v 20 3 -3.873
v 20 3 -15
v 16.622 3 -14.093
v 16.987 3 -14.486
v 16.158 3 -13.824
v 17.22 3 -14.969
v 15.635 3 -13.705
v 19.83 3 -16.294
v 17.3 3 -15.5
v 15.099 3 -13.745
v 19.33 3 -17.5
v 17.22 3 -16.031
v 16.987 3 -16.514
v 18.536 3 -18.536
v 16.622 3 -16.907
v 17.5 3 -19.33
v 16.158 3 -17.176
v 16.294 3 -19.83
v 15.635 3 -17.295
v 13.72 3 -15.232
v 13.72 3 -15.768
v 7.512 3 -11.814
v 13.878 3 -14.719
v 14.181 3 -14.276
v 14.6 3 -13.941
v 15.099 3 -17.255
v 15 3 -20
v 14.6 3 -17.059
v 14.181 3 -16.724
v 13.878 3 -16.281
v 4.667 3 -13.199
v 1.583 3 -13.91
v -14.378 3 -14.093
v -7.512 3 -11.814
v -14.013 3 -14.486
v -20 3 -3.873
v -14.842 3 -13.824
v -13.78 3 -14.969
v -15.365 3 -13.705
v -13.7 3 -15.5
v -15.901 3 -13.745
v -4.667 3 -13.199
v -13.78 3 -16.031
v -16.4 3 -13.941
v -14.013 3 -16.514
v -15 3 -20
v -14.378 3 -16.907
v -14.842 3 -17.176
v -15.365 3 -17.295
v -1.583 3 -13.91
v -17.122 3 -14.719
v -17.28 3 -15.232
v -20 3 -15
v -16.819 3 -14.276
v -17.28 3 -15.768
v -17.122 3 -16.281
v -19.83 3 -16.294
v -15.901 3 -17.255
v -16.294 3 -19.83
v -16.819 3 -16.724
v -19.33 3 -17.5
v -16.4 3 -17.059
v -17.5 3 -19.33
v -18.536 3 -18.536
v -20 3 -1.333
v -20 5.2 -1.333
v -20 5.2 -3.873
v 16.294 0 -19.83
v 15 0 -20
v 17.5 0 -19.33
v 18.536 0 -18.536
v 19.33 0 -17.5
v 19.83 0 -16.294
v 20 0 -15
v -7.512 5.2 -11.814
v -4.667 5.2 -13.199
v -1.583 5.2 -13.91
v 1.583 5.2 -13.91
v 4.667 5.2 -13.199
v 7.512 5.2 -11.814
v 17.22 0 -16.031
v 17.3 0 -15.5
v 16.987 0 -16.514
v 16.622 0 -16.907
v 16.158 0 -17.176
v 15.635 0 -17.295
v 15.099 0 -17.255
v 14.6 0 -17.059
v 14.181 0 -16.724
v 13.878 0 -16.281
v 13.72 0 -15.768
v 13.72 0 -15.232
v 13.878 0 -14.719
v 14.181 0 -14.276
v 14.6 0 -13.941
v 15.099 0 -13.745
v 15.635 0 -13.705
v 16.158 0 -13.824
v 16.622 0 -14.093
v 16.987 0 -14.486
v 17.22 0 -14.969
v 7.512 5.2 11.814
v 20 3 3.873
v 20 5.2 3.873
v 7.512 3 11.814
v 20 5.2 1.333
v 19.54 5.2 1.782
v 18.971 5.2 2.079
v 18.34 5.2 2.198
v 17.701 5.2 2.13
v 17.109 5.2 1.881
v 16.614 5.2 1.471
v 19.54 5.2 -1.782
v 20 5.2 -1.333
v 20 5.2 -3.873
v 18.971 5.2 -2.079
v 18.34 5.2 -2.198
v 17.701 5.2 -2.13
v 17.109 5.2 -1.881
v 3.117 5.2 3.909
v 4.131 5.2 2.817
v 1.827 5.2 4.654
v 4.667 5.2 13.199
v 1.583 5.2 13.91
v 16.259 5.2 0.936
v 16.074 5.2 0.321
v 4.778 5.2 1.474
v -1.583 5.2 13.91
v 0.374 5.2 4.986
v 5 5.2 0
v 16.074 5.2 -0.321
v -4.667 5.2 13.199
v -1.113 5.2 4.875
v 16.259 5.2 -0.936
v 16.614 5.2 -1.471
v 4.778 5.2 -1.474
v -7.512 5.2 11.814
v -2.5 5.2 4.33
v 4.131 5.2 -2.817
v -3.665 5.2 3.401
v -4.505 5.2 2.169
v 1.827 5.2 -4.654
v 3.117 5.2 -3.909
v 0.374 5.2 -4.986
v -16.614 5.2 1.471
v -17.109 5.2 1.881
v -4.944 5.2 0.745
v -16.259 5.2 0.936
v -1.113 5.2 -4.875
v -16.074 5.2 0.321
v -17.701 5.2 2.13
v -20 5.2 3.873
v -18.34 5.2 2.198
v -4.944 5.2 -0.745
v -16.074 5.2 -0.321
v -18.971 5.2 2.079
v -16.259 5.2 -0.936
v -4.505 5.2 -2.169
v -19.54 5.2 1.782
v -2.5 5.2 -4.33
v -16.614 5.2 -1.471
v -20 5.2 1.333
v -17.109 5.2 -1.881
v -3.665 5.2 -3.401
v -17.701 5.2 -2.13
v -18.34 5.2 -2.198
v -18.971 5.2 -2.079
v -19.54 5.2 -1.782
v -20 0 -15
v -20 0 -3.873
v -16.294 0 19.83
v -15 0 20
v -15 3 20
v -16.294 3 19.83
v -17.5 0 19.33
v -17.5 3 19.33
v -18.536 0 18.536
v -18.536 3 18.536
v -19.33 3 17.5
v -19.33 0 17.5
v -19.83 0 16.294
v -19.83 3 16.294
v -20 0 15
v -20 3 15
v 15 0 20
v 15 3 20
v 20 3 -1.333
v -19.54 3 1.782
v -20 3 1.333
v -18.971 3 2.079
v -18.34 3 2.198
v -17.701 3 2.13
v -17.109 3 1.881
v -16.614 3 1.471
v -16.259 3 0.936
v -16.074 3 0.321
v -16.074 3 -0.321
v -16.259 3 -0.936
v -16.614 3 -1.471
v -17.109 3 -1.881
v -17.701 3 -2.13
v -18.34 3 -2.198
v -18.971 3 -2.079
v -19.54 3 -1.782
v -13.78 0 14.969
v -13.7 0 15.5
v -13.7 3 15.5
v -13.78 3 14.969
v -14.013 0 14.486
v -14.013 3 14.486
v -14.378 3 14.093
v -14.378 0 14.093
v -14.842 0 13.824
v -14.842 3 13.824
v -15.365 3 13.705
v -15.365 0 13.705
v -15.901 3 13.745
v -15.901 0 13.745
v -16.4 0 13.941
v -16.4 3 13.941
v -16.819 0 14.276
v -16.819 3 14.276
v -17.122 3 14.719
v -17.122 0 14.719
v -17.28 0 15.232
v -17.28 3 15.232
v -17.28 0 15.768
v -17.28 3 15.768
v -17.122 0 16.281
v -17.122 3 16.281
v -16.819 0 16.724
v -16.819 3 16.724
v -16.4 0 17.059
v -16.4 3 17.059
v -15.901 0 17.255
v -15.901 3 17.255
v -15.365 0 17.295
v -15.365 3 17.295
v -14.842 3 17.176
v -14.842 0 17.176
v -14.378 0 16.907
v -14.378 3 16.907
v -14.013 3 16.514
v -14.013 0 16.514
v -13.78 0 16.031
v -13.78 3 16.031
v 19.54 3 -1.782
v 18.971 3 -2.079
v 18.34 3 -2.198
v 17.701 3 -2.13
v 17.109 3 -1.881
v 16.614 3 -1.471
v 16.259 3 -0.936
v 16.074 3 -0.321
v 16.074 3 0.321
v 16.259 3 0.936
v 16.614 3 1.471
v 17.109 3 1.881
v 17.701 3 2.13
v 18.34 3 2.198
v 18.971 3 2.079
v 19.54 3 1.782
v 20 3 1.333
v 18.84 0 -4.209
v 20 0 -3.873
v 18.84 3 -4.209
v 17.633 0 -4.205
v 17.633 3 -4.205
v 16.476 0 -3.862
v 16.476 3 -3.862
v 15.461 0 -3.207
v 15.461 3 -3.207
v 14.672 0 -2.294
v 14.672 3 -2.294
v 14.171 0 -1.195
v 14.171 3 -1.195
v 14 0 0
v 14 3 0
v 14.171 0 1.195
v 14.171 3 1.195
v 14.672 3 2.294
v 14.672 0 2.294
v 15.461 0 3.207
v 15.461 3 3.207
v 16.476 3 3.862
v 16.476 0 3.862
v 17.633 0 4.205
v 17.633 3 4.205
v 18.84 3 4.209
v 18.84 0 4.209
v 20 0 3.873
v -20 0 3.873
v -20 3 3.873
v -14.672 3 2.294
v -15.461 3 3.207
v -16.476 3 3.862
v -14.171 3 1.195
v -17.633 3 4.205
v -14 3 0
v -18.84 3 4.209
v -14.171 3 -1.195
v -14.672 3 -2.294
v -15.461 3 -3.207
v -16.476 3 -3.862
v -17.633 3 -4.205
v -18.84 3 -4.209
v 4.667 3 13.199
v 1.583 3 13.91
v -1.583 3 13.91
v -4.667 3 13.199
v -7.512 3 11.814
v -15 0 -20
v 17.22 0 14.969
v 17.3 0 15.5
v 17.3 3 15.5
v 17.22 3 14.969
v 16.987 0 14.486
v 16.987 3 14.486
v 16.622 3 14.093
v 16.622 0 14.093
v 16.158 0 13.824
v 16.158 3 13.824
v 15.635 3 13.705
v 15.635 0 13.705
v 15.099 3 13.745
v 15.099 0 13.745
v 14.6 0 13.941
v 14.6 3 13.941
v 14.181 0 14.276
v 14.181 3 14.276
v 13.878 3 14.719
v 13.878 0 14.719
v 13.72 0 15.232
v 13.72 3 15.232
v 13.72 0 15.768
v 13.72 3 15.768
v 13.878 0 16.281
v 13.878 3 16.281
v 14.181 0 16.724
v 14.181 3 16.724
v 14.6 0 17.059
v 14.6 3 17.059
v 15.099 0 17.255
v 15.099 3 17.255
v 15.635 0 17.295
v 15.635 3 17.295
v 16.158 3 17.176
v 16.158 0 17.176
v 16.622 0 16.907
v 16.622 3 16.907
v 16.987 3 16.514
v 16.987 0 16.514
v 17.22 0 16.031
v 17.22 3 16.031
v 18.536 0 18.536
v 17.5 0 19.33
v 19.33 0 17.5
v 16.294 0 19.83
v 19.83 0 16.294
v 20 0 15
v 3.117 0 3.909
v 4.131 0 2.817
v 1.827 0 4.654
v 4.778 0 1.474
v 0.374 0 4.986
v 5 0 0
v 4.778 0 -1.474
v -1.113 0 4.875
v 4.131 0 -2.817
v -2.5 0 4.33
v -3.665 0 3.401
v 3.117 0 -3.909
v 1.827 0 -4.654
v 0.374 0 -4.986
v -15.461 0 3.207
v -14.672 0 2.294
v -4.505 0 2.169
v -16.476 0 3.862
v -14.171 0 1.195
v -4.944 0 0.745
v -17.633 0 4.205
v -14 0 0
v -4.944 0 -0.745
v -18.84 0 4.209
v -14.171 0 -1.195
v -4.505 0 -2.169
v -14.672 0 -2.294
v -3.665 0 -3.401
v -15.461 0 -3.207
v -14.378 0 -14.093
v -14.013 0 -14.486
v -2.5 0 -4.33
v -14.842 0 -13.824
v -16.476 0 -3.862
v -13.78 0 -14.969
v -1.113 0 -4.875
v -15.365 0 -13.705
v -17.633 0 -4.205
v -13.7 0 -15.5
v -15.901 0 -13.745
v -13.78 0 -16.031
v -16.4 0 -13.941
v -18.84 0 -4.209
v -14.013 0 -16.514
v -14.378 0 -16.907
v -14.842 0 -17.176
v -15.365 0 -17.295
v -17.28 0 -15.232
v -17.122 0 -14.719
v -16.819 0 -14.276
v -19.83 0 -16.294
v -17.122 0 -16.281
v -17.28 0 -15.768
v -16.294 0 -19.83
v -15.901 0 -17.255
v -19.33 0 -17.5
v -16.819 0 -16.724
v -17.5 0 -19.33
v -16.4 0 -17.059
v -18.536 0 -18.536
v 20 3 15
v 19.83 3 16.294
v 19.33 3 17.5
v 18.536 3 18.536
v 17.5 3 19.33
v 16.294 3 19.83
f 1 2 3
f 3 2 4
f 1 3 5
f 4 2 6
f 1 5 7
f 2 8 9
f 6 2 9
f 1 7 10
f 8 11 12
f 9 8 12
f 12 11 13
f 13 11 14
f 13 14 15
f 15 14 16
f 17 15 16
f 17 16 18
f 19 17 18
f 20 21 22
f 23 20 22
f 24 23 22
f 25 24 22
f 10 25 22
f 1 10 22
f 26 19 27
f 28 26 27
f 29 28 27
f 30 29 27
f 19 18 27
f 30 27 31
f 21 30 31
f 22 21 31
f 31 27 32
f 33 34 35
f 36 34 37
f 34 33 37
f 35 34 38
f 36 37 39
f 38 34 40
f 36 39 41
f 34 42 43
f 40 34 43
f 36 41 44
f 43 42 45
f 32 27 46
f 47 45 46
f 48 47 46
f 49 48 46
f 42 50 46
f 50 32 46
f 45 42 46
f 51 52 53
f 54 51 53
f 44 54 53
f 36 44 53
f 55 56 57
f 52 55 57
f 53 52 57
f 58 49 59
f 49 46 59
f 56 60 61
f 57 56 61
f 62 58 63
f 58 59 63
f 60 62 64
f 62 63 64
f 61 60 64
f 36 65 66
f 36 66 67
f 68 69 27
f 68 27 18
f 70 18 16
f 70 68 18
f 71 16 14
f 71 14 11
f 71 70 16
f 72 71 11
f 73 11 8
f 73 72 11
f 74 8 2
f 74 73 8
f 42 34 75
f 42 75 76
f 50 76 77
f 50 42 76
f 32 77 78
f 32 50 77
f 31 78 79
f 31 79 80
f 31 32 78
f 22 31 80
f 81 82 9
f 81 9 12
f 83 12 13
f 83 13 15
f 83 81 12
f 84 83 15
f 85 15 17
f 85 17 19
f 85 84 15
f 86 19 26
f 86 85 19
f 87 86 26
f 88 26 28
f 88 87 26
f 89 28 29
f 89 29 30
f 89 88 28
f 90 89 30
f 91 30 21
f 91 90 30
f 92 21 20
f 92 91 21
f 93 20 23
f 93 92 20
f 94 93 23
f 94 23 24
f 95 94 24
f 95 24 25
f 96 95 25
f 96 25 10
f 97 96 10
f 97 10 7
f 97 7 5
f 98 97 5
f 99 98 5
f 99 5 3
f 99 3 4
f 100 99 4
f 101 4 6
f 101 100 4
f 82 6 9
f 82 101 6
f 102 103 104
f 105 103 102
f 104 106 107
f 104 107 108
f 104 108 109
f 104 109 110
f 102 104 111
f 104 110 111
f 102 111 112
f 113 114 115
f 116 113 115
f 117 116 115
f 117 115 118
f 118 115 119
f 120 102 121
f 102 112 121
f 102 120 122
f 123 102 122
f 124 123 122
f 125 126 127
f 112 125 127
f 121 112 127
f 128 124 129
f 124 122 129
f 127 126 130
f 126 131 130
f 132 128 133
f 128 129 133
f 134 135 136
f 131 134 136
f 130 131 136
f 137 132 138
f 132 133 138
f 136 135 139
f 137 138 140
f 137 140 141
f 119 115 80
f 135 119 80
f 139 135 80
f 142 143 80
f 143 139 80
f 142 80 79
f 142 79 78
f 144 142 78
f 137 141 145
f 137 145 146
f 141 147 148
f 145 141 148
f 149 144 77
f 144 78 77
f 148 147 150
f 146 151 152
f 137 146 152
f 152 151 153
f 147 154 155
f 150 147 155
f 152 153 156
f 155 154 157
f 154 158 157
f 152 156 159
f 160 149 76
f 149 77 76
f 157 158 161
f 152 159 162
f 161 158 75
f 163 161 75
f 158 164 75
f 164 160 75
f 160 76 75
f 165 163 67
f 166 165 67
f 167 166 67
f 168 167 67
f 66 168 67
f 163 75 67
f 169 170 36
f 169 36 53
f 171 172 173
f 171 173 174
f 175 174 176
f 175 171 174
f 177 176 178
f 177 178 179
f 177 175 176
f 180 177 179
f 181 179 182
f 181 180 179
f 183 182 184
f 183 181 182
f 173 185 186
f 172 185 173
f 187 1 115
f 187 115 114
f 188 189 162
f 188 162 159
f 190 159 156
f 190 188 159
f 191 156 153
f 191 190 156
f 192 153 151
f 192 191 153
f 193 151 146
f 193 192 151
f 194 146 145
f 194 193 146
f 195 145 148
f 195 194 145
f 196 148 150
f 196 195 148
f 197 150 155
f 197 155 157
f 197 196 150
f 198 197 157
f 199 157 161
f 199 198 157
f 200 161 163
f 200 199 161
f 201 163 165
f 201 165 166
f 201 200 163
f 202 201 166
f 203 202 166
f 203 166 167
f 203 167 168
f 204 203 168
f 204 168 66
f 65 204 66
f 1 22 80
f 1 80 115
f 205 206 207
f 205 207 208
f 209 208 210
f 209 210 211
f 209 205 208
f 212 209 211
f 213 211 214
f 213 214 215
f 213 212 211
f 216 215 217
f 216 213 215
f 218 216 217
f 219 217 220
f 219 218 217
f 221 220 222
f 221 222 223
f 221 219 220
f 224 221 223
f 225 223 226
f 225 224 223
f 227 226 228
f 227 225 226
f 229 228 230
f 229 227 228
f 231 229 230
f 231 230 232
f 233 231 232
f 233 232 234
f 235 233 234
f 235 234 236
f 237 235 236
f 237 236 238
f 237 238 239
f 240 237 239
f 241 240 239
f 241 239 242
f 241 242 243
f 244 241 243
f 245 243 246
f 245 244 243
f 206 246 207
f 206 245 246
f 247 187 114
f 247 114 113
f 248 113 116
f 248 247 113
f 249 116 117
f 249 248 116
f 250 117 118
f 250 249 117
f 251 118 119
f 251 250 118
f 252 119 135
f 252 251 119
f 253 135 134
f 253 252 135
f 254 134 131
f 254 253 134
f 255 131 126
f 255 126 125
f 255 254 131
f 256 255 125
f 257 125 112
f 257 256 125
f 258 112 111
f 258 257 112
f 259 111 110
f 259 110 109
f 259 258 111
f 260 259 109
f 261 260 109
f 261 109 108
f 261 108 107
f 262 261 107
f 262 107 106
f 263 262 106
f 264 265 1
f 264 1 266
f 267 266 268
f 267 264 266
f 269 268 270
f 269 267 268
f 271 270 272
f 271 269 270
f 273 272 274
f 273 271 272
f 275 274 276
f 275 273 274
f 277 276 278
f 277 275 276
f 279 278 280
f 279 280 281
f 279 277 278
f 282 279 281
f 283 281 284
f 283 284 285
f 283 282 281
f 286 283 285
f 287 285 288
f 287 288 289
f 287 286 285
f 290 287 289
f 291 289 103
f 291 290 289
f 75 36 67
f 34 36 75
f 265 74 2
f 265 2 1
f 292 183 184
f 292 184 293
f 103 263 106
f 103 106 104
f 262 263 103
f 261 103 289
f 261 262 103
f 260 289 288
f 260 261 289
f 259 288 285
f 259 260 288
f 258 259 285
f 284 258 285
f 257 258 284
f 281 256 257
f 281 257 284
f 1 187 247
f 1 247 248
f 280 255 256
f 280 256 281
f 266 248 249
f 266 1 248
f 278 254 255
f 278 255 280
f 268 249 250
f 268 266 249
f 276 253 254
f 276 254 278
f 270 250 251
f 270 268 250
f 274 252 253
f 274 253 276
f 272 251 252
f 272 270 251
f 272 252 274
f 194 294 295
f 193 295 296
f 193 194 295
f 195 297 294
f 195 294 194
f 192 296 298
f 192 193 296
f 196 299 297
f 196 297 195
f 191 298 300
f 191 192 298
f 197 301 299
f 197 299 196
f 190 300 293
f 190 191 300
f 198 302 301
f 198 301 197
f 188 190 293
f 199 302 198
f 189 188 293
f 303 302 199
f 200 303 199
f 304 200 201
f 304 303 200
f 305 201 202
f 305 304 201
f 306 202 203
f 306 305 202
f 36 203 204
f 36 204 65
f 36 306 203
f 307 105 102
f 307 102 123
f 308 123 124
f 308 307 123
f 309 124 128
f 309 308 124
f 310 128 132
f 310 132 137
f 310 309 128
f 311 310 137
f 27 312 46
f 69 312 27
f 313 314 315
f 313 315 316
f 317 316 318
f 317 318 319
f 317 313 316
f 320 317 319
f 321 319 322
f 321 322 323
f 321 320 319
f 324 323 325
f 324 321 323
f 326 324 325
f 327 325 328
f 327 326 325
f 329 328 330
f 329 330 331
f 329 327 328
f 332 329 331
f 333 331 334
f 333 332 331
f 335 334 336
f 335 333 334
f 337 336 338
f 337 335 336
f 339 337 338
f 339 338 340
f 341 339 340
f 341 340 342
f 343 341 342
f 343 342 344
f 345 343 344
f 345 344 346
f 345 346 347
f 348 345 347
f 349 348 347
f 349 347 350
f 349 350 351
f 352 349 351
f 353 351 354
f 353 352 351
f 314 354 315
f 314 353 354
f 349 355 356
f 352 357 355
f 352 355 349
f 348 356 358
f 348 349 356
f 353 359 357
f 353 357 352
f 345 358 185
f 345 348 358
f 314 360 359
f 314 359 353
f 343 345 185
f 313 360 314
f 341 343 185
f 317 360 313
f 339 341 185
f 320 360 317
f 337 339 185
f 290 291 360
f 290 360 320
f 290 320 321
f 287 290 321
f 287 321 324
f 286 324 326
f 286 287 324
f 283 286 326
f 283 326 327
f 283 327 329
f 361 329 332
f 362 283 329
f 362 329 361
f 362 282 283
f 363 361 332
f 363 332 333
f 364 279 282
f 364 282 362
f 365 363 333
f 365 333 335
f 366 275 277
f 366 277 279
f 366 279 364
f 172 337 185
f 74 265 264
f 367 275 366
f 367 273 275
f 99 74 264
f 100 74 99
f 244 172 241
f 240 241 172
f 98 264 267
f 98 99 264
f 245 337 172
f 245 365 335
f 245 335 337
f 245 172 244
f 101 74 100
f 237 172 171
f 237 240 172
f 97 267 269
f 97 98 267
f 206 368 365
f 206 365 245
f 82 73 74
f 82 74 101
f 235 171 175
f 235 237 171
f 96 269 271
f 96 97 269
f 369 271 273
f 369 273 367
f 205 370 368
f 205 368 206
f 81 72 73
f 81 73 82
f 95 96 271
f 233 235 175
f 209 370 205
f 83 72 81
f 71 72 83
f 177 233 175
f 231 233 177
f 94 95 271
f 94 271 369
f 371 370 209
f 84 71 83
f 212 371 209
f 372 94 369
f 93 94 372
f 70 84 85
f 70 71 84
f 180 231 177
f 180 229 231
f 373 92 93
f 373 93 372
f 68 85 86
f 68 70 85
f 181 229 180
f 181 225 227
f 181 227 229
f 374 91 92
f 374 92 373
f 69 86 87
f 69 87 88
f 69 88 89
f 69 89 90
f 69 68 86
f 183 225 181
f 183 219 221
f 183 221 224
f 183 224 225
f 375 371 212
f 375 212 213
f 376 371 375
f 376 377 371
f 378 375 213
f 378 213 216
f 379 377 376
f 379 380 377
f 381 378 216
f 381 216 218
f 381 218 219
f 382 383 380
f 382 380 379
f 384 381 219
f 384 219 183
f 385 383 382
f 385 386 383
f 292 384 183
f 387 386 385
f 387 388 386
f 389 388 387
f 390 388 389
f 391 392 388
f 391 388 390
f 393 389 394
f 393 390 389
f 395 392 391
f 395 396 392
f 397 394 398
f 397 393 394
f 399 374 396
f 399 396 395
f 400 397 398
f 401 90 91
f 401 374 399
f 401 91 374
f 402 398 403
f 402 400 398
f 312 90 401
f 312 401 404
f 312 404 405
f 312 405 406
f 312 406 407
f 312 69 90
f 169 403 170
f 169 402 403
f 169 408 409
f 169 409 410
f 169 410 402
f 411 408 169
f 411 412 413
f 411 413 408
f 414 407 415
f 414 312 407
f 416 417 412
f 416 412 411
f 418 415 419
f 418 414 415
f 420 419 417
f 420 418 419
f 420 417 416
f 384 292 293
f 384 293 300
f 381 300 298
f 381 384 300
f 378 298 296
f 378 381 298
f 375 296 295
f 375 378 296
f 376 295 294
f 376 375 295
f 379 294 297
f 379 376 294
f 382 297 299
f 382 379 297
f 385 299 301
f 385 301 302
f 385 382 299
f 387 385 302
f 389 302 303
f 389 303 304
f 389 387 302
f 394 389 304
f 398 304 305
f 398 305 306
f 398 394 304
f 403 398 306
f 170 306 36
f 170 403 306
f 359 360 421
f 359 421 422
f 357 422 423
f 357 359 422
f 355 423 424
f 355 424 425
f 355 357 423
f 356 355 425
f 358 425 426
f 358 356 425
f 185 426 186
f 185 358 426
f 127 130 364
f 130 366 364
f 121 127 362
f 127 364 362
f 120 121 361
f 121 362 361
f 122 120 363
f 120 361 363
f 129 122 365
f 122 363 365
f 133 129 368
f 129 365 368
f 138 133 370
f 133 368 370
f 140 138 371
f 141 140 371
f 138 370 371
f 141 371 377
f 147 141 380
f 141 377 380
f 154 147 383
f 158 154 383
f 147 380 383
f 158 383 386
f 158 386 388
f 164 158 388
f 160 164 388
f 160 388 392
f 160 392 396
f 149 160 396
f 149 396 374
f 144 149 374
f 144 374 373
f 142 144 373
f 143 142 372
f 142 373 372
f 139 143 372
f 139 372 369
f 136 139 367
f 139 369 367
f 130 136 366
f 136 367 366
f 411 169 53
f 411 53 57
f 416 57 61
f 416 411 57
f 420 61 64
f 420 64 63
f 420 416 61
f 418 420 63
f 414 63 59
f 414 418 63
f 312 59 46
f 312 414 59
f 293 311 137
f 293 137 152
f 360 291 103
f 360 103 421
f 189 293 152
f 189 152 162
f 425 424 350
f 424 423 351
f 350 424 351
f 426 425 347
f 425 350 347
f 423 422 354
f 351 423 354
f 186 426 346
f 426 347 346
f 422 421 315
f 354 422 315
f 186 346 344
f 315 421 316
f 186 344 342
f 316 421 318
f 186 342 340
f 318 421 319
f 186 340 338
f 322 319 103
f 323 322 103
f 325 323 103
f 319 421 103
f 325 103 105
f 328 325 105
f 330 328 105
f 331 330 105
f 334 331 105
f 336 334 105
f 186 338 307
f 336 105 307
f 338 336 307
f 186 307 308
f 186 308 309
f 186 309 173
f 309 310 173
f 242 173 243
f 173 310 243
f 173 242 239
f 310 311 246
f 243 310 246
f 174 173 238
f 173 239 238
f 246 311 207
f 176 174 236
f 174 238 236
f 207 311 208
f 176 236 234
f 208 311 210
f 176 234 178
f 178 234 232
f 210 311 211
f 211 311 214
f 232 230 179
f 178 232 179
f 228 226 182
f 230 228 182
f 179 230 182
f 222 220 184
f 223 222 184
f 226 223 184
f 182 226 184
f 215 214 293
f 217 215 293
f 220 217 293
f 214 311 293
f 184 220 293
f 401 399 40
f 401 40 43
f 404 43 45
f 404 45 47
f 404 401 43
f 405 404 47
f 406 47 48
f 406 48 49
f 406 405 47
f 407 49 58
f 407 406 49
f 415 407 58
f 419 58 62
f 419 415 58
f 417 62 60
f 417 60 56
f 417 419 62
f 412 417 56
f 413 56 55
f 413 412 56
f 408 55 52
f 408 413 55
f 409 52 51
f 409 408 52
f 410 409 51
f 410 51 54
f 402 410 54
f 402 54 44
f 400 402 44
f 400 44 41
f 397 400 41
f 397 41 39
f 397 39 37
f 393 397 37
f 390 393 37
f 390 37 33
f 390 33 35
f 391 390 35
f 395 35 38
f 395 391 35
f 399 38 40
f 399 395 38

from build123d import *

# Parameters (mm, degrees)
SKETCH_1_R          = 1.8
SKETCH_1_R_2        = 5
EXTRUDE_1_DEPTH     = 3
EXTRUDE_2_DEPTH     = 2.2
SKETCH_3_R          = 5
CUT_EXTRUDE_1_DEPTH = 2.2


with BuildPart() as part:
    # 草图1 → 凸台-拉伸1 (new body)
    with BuildSketch(Plane(origin=(0, 0, 0), x_dir=(1, 0, 0), z_dir=(0, 1, 0))):
        with BuildLine():
            Line((20, -3.872983346), (20, -15))
            ThreePointArc((20, -15), (18.535533906, -18.535533906), (15, -20))
            Line((15, -20), (-15, -20))
            ThreePointArc((-15, -20), (-18.535533906, -18.535533906), (-20, -15))
            Line((-20, -15), (-20, -3.872983346))
            ThreePointArc((-20, -3.872983346), (-14, 0), (-20, 3.872983346))
            Line((-20, 3.872983346), (-20, 15))
            ThreePointArc((-20, 15), (-18.535533906, 18.535533906), (-15, 20))
            Line((-15, 20), (15, 20))
            ThreePointArc((15, 20), (18.535533906, 18.535533906), (20, 15))
            Line((20, 15), (20, 3.872983346))
            ThreePointArc((20, 3.872983346), (14, 0), (20, -3.872983346))
        make_face()
        with Locations((-15.5, 15.5)):
            Circle(SKETCH_1_R, mode=Mode.SUBTRACT)
        with Locations((15.5, 15.5)):
            Circle(SKETCH_1_R, mode=Mode.SUBTRACT)
        with Locations((-15.5, -15.5)):
            Circle(SKETCH_1_R, mode=Mode.SUBTRACT)
        with Locations((15.5, -15.5)):
            Circle(SKETCH_1_R, mode=Mode.SUBTRACT)
        Circle(SKETCH_1_R_2, mode=Mode.SUBTRACT)
    extrude(amount=EXTRUDE_1_DEPTH)

    # 草图2 → 凸台-拉伸2 (add)
    with BuildSketch(Plane(origin=(0, 3, 0), x_dir=(1, 0, 0), z_dir=(0, 1, 0))):
        with BuildLine():
            Line((-20, 3.872983346), (-7.512267775, 11.81379841))
            ThreePointArc((-7.512267775, 11.81379841), (0, 14), (7.512267775, 11.81379841))
            Line((7.512267775, 11.81379841), (20, 3.872983346))
            Line((20, 3.872983346), (20, 1.333229163))
            ThreePointArc((20, 1.333229163), (16.05, 0), (20, -1.333229163))
            Line((20, -1.333229163), (20, -3.872983346))
            Line((20, -3.872983346), (7.512267775, -11.81379841))
            ThreePointArc((7.512267775, -11.81379841), (0, -14), (-7.512267775, -11.81379841))
            Line((-7.512267775, -11.81379841), (-20, -3.872983346))
            Line((-20, -3.872983346), (-20, -1.333229163))
            ThreePointArc((-20, -1.333229163), (-16.05, 0), (-20, 1.333229163))
            Line((-20, 1.333229163), (-20, 3.872983346))
        make_face()
    extrude(amount=EXTRUDE_2_DEPTH)

    # 草图3 → 切除-拉伸1 (cut)
    with BuildSketch(Plane.XZ.offset(-3)):
        Circle(SKETCH_3_R)
    extrude(amount=-CUT_EXTRUDE_1_DEPTH, mode=Mode.SUBTRACT)


solid = part.part
